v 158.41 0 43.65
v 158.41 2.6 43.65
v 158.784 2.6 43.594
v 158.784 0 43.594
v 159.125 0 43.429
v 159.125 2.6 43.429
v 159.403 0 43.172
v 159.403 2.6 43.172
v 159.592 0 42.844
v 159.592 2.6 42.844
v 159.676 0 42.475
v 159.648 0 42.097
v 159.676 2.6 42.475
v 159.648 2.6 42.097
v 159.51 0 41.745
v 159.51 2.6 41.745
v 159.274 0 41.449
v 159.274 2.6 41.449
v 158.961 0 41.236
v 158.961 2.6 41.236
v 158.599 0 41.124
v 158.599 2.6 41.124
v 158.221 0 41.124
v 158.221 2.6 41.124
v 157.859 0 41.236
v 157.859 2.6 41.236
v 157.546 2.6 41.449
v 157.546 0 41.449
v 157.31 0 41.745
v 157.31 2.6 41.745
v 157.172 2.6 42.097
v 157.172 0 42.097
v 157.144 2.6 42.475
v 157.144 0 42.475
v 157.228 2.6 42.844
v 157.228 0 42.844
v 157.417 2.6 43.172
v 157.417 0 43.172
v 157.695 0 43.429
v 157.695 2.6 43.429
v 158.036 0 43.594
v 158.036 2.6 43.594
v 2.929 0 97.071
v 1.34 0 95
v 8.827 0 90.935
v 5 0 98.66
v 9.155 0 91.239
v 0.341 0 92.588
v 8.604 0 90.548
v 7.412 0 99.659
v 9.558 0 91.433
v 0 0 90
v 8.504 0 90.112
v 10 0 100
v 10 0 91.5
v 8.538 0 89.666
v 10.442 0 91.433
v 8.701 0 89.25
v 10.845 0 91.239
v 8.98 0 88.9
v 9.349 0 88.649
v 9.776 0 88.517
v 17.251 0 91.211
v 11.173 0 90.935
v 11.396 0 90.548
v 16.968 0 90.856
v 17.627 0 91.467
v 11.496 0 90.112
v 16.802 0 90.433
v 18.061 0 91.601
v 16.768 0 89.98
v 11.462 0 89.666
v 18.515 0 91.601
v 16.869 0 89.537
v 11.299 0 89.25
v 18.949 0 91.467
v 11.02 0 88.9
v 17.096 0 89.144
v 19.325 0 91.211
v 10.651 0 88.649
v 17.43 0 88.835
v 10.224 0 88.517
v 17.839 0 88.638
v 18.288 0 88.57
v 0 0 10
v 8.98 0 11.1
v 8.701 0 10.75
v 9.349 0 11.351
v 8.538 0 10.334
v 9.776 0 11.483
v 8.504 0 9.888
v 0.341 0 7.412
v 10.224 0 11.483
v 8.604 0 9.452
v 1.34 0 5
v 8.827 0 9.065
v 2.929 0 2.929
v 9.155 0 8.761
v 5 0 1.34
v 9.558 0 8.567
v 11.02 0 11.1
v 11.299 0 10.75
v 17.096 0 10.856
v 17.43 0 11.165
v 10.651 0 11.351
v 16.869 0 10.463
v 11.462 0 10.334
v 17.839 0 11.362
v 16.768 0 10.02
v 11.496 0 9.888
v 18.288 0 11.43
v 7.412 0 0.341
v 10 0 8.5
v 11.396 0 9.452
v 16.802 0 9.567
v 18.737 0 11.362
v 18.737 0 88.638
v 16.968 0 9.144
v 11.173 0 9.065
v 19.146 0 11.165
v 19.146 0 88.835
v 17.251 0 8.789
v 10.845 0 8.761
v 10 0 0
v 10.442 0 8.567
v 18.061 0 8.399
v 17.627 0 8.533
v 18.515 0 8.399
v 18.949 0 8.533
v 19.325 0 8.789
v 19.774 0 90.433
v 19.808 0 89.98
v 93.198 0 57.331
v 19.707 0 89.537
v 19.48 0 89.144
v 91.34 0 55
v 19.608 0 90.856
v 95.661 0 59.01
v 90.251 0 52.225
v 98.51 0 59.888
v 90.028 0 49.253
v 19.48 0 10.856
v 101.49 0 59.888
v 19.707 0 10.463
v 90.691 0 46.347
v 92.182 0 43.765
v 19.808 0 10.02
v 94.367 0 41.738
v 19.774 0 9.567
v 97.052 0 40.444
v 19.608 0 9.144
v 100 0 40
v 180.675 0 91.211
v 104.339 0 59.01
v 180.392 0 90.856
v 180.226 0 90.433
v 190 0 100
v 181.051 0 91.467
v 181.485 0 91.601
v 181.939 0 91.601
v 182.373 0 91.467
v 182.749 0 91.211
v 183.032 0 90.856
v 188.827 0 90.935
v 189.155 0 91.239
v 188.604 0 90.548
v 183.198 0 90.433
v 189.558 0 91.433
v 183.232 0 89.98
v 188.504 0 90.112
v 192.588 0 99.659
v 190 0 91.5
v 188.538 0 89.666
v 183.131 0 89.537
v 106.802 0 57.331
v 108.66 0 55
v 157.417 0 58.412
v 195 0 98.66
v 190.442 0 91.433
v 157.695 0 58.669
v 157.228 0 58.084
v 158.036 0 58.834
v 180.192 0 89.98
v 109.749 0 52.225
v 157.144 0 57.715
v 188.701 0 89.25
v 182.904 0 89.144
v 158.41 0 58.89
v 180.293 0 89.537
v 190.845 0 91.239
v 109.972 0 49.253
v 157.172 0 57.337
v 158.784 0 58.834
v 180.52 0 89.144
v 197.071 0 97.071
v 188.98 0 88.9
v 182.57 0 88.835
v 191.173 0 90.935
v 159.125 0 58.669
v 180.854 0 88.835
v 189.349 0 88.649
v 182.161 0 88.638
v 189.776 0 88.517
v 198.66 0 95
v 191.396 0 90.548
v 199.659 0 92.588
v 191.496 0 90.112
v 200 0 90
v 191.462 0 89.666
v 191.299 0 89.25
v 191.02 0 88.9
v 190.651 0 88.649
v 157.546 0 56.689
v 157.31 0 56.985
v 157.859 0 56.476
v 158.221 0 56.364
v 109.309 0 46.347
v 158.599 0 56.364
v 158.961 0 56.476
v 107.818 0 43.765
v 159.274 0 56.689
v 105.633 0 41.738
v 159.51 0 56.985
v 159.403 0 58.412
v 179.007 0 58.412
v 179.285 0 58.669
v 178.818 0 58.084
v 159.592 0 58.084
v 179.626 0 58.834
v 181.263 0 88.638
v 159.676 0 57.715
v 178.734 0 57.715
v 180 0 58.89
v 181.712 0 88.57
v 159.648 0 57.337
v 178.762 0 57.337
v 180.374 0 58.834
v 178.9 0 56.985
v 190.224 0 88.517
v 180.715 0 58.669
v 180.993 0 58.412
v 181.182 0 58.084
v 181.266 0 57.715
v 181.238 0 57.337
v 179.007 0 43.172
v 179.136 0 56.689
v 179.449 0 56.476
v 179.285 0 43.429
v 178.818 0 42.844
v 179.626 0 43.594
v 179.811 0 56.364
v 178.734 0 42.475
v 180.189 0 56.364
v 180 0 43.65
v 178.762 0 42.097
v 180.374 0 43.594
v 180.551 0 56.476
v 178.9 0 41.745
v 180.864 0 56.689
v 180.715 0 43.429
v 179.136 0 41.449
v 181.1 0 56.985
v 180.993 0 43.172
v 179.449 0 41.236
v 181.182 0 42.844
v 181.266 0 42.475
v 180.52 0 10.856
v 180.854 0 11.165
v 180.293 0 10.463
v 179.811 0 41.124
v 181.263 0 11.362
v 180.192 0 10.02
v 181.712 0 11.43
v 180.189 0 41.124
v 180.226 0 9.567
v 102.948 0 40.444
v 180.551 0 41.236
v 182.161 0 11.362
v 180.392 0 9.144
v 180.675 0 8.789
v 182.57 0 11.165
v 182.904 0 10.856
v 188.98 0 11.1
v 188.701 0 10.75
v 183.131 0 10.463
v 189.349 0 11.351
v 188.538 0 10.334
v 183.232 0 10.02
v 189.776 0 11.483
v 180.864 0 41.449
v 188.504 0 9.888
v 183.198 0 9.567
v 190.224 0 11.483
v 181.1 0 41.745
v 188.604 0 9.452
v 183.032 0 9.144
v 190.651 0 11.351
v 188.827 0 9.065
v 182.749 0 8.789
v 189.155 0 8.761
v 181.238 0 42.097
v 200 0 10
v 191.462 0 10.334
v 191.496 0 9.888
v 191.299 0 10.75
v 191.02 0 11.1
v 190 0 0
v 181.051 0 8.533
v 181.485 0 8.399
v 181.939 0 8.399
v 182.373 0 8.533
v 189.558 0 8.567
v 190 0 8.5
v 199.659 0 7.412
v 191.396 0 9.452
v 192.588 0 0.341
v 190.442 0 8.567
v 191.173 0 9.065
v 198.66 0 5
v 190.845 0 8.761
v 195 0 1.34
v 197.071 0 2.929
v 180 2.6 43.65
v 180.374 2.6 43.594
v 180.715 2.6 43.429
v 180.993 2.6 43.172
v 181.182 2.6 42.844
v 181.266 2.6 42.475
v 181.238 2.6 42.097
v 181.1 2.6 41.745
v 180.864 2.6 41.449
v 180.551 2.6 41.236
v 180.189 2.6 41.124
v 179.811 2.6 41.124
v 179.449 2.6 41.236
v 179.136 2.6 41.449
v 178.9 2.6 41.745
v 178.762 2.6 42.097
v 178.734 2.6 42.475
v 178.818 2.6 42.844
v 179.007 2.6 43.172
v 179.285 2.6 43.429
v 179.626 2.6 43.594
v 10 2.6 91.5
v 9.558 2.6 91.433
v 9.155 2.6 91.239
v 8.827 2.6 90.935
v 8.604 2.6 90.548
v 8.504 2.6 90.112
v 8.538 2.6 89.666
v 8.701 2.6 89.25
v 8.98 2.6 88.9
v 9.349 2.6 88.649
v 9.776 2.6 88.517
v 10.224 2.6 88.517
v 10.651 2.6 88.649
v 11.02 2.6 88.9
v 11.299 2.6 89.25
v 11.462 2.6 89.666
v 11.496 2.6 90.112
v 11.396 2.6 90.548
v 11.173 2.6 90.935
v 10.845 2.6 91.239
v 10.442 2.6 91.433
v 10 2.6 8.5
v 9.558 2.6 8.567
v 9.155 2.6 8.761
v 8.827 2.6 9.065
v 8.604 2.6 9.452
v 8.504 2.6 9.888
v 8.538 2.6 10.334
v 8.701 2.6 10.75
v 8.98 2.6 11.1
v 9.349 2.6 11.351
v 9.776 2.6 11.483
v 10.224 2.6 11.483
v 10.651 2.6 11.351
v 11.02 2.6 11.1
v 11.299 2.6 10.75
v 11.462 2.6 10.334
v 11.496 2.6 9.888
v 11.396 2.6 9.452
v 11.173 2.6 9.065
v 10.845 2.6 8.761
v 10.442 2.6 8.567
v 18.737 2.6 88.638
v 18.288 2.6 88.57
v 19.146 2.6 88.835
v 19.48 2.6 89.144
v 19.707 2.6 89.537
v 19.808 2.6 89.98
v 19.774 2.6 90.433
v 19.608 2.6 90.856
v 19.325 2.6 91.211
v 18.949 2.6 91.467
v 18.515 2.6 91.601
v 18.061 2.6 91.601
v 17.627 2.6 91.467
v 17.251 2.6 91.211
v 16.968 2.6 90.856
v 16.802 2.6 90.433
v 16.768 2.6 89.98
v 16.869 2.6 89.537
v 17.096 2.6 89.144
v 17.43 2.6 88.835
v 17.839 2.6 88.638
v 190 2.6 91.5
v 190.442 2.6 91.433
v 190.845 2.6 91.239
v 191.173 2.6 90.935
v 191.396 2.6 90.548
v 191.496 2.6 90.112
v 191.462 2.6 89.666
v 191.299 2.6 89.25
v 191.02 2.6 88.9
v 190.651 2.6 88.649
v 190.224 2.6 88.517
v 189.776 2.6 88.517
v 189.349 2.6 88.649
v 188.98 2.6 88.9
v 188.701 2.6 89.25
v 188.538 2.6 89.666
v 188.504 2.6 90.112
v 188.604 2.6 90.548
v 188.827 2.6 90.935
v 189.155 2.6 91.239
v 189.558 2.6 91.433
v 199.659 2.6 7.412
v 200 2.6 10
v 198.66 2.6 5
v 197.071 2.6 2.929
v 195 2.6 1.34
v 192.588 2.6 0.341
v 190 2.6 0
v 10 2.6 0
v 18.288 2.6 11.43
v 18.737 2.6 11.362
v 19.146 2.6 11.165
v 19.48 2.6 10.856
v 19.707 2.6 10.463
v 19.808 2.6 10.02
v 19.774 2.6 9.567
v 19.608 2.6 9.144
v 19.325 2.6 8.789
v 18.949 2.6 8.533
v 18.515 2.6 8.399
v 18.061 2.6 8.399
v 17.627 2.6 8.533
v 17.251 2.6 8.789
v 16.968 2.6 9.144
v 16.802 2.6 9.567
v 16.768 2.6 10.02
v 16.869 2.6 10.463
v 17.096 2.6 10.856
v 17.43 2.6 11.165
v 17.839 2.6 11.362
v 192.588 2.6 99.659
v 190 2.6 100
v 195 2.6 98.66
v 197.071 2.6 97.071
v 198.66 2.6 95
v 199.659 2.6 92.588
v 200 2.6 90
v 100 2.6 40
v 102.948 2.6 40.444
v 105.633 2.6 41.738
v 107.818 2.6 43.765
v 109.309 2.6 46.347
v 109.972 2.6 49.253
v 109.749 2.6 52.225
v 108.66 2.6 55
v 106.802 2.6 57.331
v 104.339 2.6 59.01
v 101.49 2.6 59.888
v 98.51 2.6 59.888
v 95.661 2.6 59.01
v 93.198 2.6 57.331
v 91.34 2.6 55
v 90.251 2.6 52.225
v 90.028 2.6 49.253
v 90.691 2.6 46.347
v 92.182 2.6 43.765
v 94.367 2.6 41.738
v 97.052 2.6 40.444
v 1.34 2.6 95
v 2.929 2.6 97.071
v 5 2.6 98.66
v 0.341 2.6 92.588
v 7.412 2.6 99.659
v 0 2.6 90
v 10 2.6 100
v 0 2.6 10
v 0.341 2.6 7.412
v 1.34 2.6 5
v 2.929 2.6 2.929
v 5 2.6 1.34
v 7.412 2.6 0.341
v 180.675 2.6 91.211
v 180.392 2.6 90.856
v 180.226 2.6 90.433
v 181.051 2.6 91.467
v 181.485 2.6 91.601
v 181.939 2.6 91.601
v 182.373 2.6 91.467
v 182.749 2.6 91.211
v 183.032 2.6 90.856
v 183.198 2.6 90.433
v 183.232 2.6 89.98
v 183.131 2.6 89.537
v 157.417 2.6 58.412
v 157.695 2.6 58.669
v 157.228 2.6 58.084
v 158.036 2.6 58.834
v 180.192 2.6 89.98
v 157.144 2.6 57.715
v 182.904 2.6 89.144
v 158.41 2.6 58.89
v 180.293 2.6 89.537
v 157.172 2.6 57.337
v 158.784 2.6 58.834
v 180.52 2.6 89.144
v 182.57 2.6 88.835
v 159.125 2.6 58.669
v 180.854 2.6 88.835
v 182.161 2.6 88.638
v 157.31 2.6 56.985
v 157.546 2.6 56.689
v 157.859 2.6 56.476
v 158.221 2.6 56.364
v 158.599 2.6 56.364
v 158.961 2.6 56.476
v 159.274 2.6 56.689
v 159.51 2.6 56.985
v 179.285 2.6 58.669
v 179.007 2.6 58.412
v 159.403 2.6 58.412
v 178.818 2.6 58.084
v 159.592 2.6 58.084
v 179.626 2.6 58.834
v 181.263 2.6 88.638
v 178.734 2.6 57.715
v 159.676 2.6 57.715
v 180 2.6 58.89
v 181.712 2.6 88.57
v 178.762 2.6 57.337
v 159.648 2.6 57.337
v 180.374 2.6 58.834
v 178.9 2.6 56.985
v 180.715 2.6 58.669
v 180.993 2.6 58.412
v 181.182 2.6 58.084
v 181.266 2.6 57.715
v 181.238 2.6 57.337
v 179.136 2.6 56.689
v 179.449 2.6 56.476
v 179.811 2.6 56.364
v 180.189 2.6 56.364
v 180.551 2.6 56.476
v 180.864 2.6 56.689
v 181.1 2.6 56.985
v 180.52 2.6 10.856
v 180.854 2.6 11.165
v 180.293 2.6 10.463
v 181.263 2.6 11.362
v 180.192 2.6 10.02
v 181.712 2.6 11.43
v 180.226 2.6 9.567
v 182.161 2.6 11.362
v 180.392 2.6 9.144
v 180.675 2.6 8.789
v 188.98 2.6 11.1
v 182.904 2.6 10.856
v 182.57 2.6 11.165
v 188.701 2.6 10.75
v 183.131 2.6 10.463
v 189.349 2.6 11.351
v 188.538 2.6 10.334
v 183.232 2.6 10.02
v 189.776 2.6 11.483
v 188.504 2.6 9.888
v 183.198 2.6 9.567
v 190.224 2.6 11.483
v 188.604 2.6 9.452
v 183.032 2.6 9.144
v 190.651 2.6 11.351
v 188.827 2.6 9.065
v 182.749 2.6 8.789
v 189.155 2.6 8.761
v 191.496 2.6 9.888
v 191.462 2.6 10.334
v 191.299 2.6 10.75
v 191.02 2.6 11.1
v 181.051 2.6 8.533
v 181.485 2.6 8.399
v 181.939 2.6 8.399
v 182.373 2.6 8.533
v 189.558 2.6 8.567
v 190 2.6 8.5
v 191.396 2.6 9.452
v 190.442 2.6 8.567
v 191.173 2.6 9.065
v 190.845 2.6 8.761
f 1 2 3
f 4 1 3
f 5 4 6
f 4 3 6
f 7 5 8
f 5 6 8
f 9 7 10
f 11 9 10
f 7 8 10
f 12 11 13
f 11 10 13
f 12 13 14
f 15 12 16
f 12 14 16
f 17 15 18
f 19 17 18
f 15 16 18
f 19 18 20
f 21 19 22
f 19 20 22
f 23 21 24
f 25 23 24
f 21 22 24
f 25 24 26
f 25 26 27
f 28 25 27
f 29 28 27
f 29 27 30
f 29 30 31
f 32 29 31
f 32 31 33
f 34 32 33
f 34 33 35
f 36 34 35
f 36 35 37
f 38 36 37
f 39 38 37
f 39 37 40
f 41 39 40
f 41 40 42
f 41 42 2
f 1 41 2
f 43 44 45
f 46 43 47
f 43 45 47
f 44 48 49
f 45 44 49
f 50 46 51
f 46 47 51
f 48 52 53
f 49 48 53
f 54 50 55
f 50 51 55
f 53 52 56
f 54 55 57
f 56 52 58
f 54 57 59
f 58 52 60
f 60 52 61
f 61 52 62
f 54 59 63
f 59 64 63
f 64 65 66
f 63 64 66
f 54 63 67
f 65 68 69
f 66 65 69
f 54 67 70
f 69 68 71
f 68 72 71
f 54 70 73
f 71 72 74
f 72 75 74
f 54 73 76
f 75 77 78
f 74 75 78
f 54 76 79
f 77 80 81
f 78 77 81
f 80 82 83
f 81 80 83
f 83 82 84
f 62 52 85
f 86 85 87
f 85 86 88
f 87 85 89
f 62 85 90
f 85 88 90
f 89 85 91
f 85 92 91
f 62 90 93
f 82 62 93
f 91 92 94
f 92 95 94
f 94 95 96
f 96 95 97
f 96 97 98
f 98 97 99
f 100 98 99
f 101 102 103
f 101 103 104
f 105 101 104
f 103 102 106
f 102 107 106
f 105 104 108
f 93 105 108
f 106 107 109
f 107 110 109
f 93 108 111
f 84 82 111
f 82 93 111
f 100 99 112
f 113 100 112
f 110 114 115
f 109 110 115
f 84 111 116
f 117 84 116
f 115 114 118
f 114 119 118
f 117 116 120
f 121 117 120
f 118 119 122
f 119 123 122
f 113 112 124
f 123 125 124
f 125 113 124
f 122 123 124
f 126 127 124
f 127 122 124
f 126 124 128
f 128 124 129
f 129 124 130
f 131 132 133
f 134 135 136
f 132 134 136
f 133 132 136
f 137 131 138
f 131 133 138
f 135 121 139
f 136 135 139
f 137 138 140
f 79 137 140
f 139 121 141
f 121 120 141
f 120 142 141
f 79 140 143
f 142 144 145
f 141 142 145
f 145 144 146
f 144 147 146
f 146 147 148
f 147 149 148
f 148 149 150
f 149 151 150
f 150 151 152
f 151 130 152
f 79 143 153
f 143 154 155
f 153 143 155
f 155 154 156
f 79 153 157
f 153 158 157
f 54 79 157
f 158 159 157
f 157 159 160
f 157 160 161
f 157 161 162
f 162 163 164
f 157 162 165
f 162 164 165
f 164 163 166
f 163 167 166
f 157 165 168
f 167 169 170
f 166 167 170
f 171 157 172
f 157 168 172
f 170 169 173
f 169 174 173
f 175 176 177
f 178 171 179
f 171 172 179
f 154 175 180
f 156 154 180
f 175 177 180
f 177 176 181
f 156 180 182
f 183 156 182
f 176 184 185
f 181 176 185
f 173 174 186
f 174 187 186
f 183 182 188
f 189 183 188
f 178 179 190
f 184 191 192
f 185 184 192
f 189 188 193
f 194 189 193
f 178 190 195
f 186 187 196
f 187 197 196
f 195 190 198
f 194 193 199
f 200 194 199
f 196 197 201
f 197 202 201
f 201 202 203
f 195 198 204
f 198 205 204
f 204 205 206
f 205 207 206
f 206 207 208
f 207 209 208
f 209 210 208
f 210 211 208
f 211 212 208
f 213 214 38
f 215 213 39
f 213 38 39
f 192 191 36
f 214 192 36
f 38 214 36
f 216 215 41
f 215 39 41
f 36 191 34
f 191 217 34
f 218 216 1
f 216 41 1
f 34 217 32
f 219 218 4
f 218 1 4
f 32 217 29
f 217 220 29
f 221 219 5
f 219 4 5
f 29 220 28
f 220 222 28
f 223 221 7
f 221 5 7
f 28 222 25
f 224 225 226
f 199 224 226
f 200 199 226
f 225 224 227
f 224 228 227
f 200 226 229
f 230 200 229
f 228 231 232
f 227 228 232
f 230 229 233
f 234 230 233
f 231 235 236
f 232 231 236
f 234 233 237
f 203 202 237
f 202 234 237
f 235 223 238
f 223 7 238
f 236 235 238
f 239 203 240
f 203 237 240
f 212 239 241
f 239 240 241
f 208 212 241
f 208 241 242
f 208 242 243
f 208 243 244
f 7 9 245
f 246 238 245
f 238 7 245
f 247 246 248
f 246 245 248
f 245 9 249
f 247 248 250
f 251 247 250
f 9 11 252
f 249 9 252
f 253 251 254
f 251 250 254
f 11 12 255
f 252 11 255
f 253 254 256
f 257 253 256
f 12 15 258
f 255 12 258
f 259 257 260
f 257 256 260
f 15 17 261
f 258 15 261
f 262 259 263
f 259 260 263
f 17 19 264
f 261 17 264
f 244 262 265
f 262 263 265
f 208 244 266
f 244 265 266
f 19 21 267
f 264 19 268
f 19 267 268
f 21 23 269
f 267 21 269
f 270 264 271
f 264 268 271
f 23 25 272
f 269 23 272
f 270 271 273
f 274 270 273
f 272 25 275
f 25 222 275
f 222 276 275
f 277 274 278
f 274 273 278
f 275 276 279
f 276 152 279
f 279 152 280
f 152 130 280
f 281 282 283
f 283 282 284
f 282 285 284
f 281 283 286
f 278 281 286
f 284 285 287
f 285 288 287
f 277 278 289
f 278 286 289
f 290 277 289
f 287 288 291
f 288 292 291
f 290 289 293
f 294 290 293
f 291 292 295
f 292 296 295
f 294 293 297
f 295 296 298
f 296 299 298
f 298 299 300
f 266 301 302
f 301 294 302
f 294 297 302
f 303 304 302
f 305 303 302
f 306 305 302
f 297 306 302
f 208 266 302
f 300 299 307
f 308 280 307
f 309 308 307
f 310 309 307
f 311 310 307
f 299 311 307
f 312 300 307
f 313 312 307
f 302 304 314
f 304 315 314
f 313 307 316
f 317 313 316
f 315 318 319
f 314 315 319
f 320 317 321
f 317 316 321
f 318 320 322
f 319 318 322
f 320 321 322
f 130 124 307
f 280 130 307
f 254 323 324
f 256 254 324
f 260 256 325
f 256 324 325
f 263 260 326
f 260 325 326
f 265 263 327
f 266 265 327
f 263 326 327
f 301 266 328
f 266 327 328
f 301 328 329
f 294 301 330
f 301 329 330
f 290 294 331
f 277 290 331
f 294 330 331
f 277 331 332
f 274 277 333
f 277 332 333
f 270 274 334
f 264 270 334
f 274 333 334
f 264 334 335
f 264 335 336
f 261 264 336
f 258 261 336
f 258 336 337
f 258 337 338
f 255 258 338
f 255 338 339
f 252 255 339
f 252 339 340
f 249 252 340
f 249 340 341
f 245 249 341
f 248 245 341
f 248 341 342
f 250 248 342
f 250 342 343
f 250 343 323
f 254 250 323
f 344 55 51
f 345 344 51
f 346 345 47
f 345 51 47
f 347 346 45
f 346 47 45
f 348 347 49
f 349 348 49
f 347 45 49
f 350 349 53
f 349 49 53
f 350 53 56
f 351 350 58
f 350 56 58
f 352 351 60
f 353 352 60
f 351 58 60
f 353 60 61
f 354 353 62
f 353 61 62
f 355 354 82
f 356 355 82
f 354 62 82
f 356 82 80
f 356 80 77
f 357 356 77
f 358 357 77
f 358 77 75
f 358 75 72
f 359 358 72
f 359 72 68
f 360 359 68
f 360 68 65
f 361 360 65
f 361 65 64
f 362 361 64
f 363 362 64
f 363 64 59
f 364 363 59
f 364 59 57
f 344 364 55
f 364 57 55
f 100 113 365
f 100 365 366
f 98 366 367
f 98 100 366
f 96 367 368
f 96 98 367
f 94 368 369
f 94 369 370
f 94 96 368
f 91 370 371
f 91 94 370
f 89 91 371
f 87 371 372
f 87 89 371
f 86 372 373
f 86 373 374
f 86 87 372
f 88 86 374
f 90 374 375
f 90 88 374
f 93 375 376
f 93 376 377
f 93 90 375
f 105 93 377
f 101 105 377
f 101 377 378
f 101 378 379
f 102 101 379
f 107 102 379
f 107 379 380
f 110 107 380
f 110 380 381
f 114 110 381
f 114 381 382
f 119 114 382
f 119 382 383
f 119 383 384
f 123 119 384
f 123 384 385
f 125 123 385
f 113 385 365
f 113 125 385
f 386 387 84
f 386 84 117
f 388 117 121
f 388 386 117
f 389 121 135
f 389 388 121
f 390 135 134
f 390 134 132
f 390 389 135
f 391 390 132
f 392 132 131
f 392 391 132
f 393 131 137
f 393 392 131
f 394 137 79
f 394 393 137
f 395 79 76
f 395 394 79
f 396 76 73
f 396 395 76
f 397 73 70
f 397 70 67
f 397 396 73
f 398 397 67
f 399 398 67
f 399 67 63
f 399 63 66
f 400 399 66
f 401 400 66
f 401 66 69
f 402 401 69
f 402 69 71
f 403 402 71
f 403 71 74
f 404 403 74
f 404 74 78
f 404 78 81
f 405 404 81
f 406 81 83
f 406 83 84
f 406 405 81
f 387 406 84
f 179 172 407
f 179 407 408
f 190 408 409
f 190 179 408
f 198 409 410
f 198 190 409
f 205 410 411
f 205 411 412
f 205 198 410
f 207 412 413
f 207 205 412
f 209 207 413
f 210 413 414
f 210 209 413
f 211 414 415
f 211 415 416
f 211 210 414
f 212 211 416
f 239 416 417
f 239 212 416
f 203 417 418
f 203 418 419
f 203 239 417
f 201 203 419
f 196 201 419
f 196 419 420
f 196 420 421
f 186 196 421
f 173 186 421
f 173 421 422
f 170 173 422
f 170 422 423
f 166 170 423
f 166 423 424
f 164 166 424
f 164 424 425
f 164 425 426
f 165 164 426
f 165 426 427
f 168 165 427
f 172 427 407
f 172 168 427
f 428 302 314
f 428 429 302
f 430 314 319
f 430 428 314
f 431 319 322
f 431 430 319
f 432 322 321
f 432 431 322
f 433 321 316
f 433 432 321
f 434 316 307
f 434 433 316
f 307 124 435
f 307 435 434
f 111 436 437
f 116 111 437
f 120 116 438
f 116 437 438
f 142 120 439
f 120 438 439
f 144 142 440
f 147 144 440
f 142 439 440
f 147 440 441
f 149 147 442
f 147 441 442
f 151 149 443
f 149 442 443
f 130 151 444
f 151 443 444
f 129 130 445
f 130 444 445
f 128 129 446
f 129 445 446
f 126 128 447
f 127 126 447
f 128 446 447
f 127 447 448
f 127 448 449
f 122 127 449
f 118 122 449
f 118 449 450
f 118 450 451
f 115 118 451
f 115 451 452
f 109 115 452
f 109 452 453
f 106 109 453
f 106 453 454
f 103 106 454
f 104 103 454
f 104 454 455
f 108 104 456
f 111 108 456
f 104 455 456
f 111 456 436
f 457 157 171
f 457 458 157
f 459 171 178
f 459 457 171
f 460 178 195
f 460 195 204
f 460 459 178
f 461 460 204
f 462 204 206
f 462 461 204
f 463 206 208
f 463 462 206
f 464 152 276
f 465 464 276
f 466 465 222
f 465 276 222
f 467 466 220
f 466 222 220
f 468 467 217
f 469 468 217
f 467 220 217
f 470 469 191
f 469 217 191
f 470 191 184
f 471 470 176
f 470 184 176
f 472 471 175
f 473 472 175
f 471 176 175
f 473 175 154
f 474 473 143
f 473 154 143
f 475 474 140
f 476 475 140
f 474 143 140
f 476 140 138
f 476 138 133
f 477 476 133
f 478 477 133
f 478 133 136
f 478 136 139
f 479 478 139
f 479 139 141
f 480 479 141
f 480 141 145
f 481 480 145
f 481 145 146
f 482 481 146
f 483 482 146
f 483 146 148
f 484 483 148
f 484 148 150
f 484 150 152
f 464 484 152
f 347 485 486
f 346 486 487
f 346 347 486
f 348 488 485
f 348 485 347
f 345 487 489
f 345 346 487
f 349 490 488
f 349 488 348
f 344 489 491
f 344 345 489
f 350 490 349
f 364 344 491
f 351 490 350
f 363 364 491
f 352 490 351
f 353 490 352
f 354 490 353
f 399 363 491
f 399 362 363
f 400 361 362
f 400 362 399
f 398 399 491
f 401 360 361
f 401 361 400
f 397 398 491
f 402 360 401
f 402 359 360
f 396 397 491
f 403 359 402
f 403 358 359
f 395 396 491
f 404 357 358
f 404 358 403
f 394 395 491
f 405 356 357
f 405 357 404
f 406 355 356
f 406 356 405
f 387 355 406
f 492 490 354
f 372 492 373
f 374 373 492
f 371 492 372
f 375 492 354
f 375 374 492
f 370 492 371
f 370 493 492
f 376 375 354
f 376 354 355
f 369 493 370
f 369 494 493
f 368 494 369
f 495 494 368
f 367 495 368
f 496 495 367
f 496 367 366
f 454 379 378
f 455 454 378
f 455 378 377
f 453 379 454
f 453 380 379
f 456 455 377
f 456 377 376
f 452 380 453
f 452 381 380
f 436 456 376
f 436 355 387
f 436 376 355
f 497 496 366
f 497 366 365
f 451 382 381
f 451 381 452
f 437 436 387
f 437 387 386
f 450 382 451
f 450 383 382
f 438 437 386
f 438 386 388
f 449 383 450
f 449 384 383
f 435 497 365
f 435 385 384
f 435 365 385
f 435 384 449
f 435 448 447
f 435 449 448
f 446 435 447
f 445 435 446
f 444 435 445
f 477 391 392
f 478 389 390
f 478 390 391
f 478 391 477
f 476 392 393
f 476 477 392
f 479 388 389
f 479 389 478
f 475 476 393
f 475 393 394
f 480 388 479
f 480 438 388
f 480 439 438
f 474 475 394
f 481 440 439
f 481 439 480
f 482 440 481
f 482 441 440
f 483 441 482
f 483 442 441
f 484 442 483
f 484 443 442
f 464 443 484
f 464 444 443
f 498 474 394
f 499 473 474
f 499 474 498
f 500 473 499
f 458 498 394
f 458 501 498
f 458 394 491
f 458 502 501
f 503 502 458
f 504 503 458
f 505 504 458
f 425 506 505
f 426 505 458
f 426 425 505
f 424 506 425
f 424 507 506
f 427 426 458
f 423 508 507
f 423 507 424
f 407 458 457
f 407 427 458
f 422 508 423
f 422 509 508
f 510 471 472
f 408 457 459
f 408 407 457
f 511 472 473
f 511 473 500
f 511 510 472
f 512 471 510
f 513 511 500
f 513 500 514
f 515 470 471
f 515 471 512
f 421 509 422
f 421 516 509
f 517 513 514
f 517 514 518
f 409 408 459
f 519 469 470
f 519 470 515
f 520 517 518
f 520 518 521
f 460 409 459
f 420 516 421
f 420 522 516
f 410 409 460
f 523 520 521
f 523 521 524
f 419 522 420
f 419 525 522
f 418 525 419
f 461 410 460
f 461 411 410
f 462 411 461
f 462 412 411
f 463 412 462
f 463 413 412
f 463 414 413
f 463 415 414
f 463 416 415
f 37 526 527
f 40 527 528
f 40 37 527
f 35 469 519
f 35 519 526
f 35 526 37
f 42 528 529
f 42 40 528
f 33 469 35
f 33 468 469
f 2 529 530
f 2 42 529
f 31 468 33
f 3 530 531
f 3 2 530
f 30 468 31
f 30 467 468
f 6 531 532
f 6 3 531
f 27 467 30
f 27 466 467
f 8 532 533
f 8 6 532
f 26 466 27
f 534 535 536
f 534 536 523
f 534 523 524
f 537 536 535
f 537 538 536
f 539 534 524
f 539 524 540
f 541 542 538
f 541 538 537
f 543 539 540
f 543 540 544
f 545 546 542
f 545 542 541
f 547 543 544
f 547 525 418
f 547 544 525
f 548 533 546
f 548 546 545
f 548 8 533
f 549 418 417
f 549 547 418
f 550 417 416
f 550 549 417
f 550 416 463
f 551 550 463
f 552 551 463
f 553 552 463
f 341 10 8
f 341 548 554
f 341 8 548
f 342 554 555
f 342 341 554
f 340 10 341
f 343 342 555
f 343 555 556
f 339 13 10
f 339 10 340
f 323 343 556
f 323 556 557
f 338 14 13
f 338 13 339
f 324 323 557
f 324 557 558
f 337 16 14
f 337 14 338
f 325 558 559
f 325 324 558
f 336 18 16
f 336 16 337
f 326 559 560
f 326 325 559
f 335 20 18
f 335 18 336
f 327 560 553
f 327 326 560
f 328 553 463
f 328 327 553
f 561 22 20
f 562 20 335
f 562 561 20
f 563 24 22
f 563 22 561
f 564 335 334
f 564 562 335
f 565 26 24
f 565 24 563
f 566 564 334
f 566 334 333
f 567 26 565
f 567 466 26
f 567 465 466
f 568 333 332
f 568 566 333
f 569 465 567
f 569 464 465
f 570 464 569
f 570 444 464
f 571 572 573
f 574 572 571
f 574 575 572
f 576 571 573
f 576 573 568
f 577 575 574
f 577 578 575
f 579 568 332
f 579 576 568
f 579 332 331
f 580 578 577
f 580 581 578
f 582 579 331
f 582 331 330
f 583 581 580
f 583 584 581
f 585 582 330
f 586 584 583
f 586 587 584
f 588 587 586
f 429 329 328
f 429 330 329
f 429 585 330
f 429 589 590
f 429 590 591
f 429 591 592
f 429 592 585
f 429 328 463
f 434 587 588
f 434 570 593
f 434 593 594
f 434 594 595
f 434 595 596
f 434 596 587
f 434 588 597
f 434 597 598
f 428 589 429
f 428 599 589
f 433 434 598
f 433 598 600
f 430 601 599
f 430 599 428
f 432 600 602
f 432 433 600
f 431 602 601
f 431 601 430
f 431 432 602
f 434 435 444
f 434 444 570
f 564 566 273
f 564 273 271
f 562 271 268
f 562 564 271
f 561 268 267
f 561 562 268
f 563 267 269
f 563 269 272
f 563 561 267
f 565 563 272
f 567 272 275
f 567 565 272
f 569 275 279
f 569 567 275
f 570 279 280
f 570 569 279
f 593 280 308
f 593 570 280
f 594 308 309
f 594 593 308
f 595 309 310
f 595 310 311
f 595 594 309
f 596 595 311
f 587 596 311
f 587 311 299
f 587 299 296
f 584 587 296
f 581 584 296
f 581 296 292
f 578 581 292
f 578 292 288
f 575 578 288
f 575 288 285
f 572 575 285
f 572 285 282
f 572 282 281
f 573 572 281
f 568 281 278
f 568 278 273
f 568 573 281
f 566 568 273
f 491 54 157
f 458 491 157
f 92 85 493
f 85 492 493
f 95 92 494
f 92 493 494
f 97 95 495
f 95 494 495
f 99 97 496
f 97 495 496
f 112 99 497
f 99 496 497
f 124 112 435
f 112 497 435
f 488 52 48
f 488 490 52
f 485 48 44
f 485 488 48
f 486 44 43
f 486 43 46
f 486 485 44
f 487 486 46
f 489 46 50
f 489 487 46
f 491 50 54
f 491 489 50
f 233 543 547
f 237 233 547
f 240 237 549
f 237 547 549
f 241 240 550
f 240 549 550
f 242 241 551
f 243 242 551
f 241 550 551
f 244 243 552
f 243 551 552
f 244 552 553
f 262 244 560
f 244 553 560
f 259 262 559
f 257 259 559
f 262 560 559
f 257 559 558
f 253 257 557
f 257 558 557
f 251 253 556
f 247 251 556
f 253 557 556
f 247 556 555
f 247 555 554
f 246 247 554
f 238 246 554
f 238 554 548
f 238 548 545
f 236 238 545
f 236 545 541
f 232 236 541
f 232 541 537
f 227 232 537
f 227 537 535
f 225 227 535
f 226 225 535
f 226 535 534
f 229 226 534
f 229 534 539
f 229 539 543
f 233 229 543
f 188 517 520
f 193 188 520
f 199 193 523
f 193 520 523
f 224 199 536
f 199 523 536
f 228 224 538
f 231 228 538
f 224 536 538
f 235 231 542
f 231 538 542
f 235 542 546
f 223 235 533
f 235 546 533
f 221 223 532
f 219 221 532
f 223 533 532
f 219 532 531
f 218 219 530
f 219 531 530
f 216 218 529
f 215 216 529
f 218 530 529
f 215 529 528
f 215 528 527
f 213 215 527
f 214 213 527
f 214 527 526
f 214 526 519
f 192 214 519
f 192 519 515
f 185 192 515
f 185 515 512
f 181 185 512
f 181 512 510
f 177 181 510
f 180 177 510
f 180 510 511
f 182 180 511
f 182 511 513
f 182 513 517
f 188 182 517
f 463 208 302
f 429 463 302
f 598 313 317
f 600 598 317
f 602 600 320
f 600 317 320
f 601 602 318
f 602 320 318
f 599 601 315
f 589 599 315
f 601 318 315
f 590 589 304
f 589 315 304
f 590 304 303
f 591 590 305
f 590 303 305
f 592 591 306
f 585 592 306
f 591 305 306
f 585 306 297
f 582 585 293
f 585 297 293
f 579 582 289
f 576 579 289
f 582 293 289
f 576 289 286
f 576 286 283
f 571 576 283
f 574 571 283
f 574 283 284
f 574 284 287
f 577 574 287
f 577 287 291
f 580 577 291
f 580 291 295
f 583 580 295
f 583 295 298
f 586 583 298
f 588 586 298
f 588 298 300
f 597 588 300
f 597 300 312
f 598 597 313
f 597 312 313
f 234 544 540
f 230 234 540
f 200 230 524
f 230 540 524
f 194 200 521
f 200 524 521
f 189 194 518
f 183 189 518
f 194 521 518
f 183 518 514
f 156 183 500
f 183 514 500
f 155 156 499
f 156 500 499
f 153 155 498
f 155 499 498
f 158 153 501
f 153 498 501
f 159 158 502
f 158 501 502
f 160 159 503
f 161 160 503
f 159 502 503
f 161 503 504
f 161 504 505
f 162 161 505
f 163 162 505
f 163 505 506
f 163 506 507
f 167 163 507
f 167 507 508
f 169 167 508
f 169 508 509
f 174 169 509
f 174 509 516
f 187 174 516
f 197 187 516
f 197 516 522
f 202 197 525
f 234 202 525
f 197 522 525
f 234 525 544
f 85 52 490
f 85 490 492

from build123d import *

# Parameters (mm, degrees)
SKETCH1_W               = 200
SKETCH1_H               = 100
BOSS_EXTRUDE1_DEPTH     = 2.6
FILLET1_R               = 10
SKETCH6_R               = 1.5
CUT_EXTRUDE6_DEPTH      = 2.6
MIRROR6_COPY_1_SKETCH_R = 1.5
MIRROR6_COPY_1_DEPTH    = 2.6
SKETCH15_R              = 10
CUT_EXTRUDE14_DEPTH     = 224.621913059
SKETCH20_R              = 1.27
CUT_EXTRUDE15_DEPTH     = 224.621913059
SKETCH23_R              = 1.524
CUT_EXTRUDE16_DEPTH     = 2.59999988
MIRROR8_COPY_1_SKETCH_R = 1.524
MIRROR8_COPY_1_DEPTH    = 2.59999988


with BuildPart() as part:
    # Sketch1 → Boss-Extrude1 (new body)
    with BuildSketch(Plane(origin=(0, 0, 0), x_dir=(1, 0, 0), z_dir=(0, 1, 0))):
        with Locations((100, -50)):
            Rectangle(SKETCH1_W, SKETCH1_H)
    extrude(amount=BOSS_EXTRUDE1_DEPTH)

    # Fillet1
    fillet1_edges = [part.edges().sort_by_distance(p)[0] for p in [
        (0, 1.3, 0),
        (200, 1.3, 0),
        (200, 1.3, 100),
        (0, 1.3, 100),
    ]]
    fillet(fillet1_edges, radius=FILLET1_R)

    # Sketch6 → Cut-Extrude6 (cut)
    with BuildSketch(Plane.XZ):
        with Locations(Location((190, 10, 0), (0, 0, 270))):
            Circle(SKETCH6_R)
    cut_extrude6 = extrude(amount=-CUT_EXTRUDE6_DEPTH, mode=Mode.SUBTRACT)

    # Mirror5: Cut-Extrude6 across plane
    add(cut_extrude6.mirror(Plane(origin=(100, 0, 0), x_dir=(0, 0, 1), z_dir=(1, 0, 0))), mode=Mode.SUBTRACT)

    # Mirror6: Cut-Extrude6 across plane
    add(cut_extrude6.mirror(Plane.XY.offset(50)), mode=Mode.SUBTRACT)

    # Mirror6 copy 1 sketch → Mirror6 copy 1 (cut)
    with BuildSketch(Plane(origin=(200, 0, 100), x_dir=(-1, 0, 0), z_dir=(0, -1, 0))):
        with Locations(Location((190, 10, 0), (0, 0, 270))):
            Circle(MIRROR6_COPY_1_SKETCH_R)
    extrude(amount=-MIRROR6_COPY_1_DEPTH, mode=Mode.SUBTRACT)

    # Sketch15 → Cut-Extrude14 (cut, through all)
    with BuildSketch(Plane.XZ):
        with Locations(Location((100, 50, 0), (0, 0, 270))):
            Circle(SKETCH15_R)
    extrude(amount=-CUT_EXTRUDE14_DEPTH, mode=Mode.SUBTRACT)

    # Sketch20 → Cut-Extrude15 (cut, through all)
    with BuildSketch(Plane(origin=(0, 2.6, 0), x_dir=(1, 0, 0), z_dir=(0, 1, 0))):
        with Locations(Location((158.41, -42.38, 0), (0, 0, 270))):
            Circle(SKETCH20_R)
        with Locations(Location((180, -42.38, 0), (0, 0, 270))):
            Circle(SKETCH20_R)
        with Locations(Location((158.41, -57.62, 0), (0, 0, 270))):
            Circle(SKETCH20_R)
        with Locations(Location((180, -57.62, 0), (0, 0, 270))):
            Circle(SKETCH20_R)
    extrude(amount=-CUT_EXTRUDE15_DEPTH, mode=Mode.SUBTRACT)

    # Sketch23 → Cut-Extrude16 (cut)
    with BuildSketch(Plane(origin=(0, 2.6, 0), x_dir=(1, 0, 0), z_dir=(0, 1, 0))):
        with Locations(Location((18.288, -9.906, 0), (0, 0, 270))):
            Circle(SKETCH23_R)
    cut_extrude16 = extrude(amount=-CUT_EXTRUDE16_DEPTH, mode=Mode.SUBTRACT)

    # Mirror7: Cut-Extrude16 across plane
    add(cut_extrude16.mirror(Plane(origin=(100, 0, 0), x_dir=(0, 0, 1), z_dir=(1, 0, 0))), mode=Mode.SUBTRACT)

    # Mirror8: Cut-Extrude16 across plane
    add(cut_extrude16.mirror(Plane.XY.offset(50)), mode=Mode.SUBTRACT)

    # Mirror8 copy 1 sketch → Mirror8 copy 1 (cut)
    with BuildSketch(Plane(origin=(200, 2.6, 100), x_dir=(-1, 0, 0), z_dir=(0, 1, 0))):
        with Locations(Location((18.288, -9.906, 0), (0, 0, 270))):
            Circle(MIRROR8_COPY_1_SKETCH_R)
    extrude(amount=-MIRROR8_COPY_1_DEPTH, mode=Mode.SUBTRACT)


solid = part.part
